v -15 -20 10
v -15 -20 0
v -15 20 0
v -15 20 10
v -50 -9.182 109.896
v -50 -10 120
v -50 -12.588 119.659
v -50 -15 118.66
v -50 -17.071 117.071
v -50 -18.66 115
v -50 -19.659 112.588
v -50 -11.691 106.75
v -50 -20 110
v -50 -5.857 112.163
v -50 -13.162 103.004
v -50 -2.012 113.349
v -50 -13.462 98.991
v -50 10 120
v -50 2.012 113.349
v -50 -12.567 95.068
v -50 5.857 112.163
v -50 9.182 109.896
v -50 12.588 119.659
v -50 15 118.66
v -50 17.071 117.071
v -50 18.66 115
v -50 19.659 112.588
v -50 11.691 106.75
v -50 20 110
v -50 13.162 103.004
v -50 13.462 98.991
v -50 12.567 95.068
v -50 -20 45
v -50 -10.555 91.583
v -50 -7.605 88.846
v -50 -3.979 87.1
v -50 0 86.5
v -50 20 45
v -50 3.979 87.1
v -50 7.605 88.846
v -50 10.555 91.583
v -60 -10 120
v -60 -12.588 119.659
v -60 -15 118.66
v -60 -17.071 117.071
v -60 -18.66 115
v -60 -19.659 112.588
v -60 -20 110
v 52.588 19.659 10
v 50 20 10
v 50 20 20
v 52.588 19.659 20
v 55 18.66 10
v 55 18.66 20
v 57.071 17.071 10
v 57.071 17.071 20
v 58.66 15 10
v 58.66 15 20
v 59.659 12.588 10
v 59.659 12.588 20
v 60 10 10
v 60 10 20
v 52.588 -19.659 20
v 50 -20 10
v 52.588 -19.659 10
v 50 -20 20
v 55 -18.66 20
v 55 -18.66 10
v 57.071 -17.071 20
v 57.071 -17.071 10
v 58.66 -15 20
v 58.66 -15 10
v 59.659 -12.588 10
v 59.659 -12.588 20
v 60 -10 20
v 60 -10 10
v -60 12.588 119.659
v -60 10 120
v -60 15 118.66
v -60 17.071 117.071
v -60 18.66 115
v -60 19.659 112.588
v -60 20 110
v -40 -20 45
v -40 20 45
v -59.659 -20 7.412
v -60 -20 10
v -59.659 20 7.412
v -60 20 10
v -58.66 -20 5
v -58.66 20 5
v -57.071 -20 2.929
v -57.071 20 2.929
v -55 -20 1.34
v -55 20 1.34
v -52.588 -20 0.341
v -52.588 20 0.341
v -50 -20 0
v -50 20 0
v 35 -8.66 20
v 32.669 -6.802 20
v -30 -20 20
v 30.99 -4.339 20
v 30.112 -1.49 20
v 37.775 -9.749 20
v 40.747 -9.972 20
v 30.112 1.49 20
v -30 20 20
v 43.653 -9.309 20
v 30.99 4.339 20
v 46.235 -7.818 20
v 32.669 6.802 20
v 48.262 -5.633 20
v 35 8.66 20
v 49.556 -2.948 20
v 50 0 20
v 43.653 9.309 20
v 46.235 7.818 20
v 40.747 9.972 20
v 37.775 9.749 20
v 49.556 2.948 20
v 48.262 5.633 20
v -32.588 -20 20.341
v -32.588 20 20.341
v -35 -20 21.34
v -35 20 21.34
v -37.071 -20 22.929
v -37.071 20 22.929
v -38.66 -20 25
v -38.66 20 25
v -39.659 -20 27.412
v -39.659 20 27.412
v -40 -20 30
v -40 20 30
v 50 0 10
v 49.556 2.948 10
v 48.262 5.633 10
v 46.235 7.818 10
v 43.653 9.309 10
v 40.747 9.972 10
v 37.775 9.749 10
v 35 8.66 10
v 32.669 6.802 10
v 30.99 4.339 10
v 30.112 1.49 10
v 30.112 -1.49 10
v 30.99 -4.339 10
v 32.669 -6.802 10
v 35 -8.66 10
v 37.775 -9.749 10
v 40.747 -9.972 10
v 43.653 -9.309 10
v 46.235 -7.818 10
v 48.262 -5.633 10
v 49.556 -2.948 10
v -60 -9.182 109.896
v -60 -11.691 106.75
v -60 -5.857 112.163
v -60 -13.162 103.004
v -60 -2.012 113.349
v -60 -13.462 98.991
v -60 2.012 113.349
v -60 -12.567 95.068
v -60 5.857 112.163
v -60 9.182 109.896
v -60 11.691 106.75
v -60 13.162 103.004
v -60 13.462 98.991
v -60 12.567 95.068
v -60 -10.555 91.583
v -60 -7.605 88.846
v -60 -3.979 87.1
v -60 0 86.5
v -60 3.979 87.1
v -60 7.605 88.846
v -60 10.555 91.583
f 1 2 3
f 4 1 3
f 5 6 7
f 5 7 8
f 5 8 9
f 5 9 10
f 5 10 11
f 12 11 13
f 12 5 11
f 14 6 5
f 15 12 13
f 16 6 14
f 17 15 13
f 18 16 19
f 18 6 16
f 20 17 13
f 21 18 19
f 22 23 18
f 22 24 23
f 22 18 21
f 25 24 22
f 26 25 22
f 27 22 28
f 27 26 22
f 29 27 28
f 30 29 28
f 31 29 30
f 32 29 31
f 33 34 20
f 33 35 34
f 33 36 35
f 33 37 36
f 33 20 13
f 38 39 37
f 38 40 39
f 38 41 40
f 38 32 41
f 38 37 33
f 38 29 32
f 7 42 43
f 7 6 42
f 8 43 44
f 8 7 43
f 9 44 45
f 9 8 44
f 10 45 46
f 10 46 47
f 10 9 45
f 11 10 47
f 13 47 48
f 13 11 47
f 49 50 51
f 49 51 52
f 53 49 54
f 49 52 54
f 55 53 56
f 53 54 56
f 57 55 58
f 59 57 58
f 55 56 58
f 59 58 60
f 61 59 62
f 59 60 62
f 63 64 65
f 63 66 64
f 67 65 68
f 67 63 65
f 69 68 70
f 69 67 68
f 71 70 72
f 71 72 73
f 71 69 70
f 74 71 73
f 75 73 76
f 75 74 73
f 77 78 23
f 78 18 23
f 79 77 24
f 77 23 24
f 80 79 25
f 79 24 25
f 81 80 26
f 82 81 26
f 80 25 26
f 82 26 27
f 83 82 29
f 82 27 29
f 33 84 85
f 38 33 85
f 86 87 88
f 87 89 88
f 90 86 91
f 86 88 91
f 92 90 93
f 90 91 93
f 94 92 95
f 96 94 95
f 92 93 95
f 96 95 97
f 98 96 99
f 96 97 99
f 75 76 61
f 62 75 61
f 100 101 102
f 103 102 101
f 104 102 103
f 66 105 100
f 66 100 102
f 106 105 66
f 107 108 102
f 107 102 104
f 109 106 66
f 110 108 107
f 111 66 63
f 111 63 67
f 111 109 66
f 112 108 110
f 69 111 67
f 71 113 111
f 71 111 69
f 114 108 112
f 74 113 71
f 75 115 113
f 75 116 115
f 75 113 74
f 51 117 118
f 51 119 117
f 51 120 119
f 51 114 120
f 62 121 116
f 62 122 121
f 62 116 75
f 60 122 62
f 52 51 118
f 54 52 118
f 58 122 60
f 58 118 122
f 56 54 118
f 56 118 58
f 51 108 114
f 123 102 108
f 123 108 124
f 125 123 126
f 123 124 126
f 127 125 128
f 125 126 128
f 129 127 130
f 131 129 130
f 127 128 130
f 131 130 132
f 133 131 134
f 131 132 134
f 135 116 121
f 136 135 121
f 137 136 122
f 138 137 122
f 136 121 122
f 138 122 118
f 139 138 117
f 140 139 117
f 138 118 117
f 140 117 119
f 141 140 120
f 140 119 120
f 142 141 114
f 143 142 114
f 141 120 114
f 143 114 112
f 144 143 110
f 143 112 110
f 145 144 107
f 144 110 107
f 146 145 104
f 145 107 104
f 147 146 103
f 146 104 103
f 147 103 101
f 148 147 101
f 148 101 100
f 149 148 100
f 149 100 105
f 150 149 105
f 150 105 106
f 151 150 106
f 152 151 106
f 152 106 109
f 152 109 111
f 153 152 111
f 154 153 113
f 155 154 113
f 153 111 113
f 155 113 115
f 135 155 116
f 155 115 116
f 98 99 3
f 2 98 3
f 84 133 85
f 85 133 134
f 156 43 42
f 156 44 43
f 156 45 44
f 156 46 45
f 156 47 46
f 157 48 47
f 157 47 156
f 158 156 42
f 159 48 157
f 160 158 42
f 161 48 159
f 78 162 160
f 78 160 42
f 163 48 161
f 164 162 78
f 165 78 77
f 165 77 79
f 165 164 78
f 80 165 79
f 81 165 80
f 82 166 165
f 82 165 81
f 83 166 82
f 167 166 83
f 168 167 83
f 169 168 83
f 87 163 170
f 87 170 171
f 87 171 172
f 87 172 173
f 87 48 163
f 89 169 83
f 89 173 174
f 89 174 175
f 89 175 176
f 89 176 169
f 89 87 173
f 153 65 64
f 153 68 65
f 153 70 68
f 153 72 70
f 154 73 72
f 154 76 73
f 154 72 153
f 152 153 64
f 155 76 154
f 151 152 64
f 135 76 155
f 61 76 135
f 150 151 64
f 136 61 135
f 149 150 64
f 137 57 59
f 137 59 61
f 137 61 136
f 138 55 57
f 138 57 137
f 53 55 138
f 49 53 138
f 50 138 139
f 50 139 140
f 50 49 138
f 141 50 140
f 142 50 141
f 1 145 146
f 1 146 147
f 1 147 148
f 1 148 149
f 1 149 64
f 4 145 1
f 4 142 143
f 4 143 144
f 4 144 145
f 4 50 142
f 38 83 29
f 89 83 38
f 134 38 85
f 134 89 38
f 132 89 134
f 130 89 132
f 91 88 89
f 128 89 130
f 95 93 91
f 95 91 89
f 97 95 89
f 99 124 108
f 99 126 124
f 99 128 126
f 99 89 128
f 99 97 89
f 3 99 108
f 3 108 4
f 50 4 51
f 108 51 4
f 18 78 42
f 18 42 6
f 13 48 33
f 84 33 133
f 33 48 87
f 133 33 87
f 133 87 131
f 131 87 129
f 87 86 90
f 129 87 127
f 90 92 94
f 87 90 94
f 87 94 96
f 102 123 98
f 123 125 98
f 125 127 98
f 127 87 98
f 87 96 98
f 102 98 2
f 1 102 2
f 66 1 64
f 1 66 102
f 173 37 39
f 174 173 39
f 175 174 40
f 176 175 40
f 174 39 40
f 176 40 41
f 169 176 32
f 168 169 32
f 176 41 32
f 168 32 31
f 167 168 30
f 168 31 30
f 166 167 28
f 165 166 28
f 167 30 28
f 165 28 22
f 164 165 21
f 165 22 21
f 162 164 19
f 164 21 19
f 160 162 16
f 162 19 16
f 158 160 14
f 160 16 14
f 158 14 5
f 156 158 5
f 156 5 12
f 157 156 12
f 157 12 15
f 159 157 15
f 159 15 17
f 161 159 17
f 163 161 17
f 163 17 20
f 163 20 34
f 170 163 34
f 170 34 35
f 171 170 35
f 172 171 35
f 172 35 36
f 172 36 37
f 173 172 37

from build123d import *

# Parameters (mm, degrees)
SKETCH2_W           = 120
SKETCH2_H           = 40
BOSS_EXTRUDE1_DEPTH = 20
SKETCH3_W           = 20
SKETCH3_H           = 40
BOSS_EXTRUDE2_DEPTH = 100
SKETCH4_W           = 75
SKETCH4_H           = 40
CUT_EXTRUDE1_DEPTH  = 10
SKETCH5_W           = 75
SKETCH5_H           = 40
CUT_EXTRUDE2_DEPTH  = 10
CUT_EXTRUDE3_REACH  = 12
SKETCH6_R           = 13.5
FILLET2_R           = 10
SKETCH7_R           = 10
CUT_EXTRUDE4_DEPTH  = 10
FILLET3_R           = 10


with BuildPart() as part:
    # Sketch2 → Boss-Extrude1 (new body)
    with BuildSketch(Plane.XY):
        Rectangle(SKETCH2_W, SKETCH2_H)
    extrude(amount=BOSS_EXTRUDE1_DEPTH)

    # Sketch3 → Boss-Extrude2 (add)
    with BuildSketch(Plane.XY.offset(20)):
        with Locations((-50, 0)):
            Rectangle(SKETCH3_W, SKETCH3_H)
    extrude(amount=BOSS_EXTRUDE2_DEPTH)

    # Sketch4 → Cut-Extrude1 (cut)
    with BuildSketch(Plane(origin=(0, 0, 0), x_dir=(-1, 0, 0), z_dir=(0, 0, -1))):
        with Locations((-22.5, 0)):
            Rectangle(SKETCH4_W, SKETCH4_H)
    extrude(amount=-CUT_EXTRUDE1_DEPTH, mode=Mode.SUBTRACT)

    # Sketch5 → Cut-Extrude2 (cut)
    with BuildSketch(Plane(origin=(-40, 0, 0), x_dir=(0, 0, -1), z_dir=(1, 0, 0))):
        with Locations((-82.5, 0)):
            Rectangle(SKETCH5_W, SKETCH5_H)
    extrude(amount=-CUT_EXTRUDE2_DEPTH, mode=Mode.SUBTRACT)

    # Sketch6 → Cut-Extrude3 (cut, up to next)
    with BuildSketch(Plane(origin=(-50, 0, 0), x_dir=(0, 0, -1), z_dir=(1, 0, 0)), mode=Mode.PRIVATE) as cut_extrude3_sk1:
        with Locations((-100, 0)):
            Circle(SKETCH6_R)
    cut_extrude3_tool1 = extrude(cut_extrude3_sk1.sketch, amount=-CUT_EXTRUDE3_REACH, mode=Mode.PRIVATE) & part.part
    add(cut_extrude3_tool1.solids().sort_by_distance((-50, 0, 100))[0], mode=Mode.SUBTRACT)

    # Fillet2
    fillet2_edges = [part.edges().sort_by_distance(p)[0] for p in [
        (60, 20, 15),
        (60, -20, 15),
        (-55, -20, 120),
        (-55, 20, 120),
        (-60, 0, 0),
    ]]
    fillet(fillet2_edges, radius=FILLET2_R)

    # Sketch7 → Cut-Extrude4 (cut)
    with BuildSketch(Plane.XY.offset(20)):
        with Locations((40, 0)):
            Circle(SKETCH7_R)
    extrude(amount=-CUT_EXTRUDE4_DEPTH, mode=Mode.SUBTRACT)

    # Fillet3
    fillet3_edges = [part.edges().sort_by_distance(p)[0] for p in [
        (-40, 0, 20),
    ]]
    fillet(fillet3_edges, radius=FILLET3_R)


solid = part.part
